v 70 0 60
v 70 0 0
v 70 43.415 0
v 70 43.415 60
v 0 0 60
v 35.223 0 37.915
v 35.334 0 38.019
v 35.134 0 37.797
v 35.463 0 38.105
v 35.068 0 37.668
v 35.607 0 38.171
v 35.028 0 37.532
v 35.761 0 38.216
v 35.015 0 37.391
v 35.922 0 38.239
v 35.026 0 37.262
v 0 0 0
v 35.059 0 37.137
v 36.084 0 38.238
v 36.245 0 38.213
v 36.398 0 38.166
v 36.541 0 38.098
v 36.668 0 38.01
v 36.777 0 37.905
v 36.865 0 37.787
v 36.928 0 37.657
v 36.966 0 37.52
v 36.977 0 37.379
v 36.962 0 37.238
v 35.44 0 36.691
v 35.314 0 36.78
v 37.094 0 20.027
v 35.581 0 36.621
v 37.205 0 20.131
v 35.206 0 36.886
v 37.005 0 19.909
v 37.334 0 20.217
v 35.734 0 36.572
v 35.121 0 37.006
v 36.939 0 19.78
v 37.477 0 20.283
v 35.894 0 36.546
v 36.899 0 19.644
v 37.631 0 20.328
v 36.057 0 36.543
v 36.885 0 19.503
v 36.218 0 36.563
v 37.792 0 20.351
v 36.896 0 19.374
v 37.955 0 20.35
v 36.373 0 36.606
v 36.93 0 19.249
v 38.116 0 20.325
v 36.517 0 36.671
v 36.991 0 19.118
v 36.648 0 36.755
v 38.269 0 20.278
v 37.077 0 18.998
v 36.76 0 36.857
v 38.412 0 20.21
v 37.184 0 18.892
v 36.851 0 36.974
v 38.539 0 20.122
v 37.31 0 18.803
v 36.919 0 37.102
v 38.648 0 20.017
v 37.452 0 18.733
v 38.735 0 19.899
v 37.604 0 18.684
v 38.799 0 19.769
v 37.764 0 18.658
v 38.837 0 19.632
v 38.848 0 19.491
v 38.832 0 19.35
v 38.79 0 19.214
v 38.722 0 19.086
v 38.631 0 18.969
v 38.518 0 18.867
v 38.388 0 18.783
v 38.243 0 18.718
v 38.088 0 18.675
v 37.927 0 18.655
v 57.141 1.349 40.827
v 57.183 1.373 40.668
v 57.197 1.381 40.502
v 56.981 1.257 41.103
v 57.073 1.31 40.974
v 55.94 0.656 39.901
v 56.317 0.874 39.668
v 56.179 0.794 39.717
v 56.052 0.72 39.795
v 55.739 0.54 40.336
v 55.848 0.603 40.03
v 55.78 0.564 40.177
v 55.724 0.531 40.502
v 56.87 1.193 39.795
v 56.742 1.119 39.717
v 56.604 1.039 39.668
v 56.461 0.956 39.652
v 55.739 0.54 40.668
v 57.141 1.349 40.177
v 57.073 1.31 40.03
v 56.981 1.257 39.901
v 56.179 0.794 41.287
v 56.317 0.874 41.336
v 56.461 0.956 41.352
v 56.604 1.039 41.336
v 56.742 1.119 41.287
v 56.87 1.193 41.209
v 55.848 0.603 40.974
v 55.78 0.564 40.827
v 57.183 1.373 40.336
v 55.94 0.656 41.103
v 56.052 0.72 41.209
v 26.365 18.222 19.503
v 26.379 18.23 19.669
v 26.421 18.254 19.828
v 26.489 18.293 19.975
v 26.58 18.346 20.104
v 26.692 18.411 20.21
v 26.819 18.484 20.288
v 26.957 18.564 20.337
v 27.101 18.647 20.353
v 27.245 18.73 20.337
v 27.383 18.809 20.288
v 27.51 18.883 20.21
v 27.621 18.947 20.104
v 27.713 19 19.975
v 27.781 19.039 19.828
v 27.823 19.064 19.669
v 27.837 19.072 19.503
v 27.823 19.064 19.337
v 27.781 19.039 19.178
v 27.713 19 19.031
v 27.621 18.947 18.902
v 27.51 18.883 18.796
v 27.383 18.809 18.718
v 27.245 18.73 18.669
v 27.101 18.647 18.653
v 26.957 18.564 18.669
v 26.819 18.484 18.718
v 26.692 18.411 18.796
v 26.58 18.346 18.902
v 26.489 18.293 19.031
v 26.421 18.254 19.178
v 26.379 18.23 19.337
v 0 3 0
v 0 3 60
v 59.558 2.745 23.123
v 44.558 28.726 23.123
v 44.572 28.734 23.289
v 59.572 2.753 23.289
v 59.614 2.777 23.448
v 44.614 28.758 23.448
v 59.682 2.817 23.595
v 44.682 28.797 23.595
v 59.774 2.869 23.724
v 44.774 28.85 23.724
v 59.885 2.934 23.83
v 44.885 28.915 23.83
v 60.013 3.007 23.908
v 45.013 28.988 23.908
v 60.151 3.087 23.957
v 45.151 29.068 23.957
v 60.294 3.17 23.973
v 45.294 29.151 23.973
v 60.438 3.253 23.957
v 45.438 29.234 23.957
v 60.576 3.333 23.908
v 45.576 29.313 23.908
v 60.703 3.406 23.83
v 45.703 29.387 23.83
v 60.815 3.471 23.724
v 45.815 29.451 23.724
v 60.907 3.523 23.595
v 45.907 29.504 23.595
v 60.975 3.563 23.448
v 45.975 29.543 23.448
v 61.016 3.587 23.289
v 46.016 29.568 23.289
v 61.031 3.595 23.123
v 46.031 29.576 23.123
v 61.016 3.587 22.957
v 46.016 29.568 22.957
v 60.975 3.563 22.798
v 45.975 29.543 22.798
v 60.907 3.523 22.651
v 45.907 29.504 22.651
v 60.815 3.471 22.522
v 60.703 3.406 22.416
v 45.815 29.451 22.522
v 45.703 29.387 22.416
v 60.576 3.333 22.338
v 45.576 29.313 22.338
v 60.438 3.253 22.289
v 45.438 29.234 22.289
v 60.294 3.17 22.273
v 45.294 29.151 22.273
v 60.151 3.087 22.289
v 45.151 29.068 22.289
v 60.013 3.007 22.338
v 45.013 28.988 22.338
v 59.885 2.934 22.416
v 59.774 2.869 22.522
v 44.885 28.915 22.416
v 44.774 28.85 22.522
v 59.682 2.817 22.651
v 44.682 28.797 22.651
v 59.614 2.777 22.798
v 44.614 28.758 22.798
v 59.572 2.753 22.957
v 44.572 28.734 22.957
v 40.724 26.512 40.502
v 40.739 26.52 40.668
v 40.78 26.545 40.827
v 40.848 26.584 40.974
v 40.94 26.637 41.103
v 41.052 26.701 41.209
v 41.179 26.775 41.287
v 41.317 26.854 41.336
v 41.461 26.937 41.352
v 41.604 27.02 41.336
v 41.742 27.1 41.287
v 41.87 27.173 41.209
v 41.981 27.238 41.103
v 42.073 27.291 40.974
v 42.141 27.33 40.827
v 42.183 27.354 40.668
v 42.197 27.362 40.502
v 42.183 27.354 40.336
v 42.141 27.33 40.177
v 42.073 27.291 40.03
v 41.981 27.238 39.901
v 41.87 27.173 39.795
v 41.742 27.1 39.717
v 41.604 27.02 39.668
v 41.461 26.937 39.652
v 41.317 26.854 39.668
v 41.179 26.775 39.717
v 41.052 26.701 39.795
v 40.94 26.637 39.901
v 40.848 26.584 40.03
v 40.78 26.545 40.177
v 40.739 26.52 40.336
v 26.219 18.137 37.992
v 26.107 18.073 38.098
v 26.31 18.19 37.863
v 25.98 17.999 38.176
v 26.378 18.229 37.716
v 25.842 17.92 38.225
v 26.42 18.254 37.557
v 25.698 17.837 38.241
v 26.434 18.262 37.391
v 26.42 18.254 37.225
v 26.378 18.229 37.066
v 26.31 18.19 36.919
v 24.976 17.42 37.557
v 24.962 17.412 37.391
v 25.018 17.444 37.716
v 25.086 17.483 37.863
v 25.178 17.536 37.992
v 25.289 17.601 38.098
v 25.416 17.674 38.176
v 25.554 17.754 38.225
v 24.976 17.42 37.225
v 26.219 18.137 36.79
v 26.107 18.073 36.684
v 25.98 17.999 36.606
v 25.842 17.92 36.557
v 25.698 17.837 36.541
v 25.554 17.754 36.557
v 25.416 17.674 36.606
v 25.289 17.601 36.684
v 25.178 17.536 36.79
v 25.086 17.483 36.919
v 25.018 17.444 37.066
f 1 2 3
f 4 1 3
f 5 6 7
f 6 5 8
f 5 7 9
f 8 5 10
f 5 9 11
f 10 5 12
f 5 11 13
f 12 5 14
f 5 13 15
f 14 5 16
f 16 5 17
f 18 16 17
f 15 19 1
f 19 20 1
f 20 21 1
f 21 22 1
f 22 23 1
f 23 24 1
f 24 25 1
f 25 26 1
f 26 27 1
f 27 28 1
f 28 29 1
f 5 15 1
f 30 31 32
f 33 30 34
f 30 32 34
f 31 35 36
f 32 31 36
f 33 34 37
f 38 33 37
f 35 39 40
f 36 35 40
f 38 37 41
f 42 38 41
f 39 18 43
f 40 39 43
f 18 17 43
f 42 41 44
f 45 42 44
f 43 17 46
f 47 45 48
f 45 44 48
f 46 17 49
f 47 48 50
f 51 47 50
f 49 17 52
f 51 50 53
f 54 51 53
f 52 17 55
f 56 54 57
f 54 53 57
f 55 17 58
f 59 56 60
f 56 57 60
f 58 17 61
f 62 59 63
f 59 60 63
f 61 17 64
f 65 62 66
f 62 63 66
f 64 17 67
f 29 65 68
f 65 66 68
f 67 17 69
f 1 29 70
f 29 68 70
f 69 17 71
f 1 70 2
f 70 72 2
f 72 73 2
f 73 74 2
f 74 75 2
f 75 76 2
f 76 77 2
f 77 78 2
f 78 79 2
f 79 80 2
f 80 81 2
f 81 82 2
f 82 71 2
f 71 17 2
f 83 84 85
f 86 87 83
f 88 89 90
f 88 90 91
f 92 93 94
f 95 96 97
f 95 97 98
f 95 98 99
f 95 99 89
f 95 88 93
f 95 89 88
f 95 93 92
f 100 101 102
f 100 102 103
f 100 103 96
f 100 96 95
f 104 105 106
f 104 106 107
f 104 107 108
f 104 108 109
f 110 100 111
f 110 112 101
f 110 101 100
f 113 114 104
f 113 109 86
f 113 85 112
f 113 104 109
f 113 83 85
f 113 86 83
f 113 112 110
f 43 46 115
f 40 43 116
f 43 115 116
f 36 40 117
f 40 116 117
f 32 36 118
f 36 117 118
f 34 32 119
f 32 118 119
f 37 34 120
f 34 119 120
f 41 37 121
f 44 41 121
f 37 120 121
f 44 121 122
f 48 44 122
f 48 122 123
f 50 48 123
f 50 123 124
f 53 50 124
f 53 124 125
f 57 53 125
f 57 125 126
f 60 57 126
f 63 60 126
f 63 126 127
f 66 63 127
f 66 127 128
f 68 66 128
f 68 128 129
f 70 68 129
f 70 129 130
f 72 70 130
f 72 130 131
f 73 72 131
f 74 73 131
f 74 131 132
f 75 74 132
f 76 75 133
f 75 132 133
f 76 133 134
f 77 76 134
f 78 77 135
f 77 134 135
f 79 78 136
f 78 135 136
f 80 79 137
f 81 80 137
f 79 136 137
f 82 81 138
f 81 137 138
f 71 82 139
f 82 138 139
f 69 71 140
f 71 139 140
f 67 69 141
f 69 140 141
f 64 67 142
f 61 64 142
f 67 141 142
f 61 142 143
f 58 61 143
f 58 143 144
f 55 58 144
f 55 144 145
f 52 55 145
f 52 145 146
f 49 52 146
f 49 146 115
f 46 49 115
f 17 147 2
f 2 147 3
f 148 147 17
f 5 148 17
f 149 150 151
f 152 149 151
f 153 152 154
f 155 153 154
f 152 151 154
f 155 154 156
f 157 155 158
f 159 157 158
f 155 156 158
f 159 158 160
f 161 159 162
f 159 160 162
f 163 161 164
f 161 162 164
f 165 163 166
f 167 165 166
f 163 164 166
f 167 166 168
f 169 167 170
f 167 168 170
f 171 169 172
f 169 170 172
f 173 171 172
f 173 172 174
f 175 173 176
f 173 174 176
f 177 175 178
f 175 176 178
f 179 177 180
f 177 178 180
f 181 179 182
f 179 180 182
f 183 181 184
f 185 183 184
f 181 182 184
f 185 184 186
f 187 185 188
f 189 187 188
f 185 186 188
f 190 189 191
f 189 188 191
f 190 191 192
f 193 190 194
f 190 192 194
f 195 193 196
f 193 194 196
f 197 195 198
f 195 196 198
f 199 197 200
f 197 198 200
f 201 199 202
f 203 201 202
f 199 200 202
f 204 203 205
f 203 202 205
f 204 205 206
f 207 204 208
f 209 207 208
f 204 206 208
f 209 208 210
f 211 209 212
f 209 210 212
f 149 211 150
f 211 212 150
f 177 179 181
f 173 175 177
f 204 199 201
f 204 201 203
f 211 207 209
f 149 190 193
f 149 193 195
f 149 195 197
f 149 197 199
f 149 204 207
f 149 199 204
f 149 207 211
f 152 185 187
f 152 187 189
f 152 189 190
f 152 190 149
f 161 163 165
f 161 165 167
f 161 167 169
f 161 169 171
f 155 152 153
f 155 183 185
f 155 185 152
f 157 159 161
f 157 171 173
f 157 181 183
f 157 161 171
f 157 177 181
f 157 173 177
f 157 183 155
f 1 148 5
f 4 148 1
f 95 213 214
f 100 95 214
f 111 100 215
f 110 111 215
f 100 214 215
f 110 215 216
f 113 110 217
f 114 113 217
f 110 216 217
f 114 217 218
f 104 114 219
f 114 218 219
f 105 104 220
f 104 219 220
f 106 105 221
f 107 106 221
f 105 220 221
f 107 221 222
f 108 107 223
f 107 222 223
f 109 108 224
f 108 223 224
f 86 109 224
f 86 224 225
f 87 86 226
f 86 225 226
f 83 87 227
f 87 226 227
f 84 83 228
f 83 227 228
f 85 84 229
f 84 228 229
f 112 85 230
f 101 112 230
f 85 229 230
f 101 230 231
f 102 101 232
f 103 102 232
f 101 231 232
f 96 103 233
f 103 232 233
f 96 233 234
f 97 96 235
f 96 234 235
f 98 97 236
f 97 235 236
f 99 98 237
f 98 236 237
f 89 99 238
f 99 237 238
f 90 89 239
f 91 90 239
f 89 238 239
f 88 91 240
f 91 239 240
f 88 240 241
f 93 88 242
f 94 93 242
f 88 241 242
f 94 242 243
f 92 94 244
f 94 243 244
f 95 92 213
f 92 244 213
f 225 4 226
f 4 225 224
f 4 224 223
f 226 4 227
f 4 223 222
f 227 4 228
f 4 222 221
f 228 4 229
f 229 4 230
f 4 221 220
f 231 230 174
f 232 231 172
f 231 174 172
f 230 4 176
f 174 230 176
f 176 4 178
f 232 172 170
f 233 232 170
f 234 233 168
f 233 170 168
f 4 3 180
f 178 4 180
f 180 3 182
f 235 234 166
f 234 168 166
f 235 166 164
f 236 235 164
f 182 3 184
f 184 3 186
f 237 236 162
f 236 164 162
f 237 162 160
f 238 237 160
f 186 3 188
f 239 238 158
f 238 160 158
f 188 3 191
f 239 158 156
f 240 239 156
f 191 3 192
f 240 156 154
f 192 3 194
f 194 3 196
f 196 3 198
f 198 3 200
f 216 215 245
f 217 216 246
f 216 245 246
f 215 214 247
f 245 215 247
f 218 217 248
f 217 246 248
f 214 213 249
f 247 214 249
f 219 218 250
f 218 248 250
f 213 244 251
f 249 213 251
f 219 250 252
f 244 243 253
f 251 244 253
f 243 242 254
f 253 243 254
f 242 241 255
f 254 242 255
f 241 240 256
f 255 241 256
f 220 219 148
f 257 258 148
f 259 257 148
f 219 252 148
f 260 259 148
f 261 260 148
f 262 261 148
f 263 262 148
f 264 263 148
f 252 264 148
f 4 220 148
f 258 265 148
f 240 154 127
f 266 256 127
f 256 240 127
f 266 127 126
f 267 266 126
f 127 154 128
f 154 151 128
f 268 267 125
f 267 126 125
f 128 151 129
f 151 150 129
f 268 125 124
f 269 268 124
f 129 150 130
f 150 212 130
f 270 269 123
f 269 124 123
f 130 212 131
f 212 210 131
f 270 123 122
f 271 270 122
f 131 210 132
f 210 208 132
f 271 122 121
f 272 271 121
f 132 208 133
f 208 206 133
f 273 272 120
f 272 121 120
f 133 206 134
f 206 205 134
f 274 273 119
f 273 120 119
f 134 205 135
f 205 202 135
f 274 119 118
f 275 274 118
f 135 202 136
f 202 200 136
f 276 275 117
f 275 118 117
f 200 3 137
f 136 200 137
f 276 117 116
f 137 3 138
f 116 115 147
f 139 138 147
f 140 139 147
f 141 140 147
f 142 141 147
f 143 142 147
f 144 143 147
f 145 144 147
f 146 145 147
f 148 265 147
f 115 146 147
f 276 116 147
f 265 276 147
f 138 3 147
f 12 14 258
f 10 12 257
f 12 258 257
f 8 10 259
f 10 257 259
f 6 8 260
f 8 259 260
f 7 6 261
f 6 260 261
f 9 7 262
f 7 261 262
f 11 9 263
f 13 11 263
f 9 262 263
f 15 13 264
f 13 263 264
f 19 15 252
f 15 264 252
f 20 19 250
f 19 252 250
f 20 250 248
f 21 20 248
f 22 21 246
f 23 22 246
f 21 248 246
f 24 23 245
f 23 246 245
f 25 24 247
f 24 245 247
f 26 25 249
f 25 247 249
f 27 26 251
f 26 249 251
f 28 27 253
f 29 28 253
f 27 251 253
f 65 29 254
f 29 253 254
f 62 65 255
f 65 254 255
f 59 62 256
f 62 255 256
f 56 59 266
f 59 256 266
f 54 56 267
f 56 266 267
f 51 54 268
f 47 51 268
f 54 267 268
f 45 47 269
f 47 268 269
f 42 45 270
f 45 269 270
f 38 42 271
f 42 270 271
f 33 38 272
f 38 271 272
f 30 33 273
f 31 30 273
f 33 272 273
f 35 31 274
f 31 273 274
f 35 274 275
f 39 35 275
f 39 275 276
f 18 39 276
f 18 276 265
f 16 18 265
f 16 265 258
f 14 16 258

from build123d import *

# Parameters (mm, degrees)
EXTRUDE_1_DEPTH     = 60
SKETCH_2_R          = 0.85
CUT_EXTRUDE_1_DEPTH = 30


with BuildPart() as part:
    # 草图1 → 凸台-拉伸1 (new body)
    with BuildSketch(Plane.XY):
        Polygon((0, 0), (70, 0), (70, 43.414518843), (0, 3), align=None)
    extrude(amount=EXTRUDE_1_DEPTH)

    # 草图2 → 切除-拉伸1 (cut, symmetric)
    with BuildSketch(Plane(origin=(-1.299038106, 2.25, 0), x_dir=(0.8660254037844386, 0.5, 0), z_dir=(-0.5000000000000001, 0.8660254037844387, 0))):
        with Locations(Location((32.793518843, -19.503, 0), (0, 0, 180))):
            Circle(SKETCH_2_R)
        with Locations(Location((53.801518843, -23.123, 0), (0, 0, 180))):
            Circle(SKETCH_2_R)
        with Locations(Location((49.374518843, -40.502, 0), (0, 0, 180))):
            Circle(SKETCH_2_R)
        with Locations(Location((31.173518843, -37.391, 0), (0, 0, 180))):
            Circle(SKETCH_2_R)
    extrude(amount=CUT_EXTRUDE_1_DEPTH, both=True, mode=Mode.SUBTRACT)


solid = part.part
